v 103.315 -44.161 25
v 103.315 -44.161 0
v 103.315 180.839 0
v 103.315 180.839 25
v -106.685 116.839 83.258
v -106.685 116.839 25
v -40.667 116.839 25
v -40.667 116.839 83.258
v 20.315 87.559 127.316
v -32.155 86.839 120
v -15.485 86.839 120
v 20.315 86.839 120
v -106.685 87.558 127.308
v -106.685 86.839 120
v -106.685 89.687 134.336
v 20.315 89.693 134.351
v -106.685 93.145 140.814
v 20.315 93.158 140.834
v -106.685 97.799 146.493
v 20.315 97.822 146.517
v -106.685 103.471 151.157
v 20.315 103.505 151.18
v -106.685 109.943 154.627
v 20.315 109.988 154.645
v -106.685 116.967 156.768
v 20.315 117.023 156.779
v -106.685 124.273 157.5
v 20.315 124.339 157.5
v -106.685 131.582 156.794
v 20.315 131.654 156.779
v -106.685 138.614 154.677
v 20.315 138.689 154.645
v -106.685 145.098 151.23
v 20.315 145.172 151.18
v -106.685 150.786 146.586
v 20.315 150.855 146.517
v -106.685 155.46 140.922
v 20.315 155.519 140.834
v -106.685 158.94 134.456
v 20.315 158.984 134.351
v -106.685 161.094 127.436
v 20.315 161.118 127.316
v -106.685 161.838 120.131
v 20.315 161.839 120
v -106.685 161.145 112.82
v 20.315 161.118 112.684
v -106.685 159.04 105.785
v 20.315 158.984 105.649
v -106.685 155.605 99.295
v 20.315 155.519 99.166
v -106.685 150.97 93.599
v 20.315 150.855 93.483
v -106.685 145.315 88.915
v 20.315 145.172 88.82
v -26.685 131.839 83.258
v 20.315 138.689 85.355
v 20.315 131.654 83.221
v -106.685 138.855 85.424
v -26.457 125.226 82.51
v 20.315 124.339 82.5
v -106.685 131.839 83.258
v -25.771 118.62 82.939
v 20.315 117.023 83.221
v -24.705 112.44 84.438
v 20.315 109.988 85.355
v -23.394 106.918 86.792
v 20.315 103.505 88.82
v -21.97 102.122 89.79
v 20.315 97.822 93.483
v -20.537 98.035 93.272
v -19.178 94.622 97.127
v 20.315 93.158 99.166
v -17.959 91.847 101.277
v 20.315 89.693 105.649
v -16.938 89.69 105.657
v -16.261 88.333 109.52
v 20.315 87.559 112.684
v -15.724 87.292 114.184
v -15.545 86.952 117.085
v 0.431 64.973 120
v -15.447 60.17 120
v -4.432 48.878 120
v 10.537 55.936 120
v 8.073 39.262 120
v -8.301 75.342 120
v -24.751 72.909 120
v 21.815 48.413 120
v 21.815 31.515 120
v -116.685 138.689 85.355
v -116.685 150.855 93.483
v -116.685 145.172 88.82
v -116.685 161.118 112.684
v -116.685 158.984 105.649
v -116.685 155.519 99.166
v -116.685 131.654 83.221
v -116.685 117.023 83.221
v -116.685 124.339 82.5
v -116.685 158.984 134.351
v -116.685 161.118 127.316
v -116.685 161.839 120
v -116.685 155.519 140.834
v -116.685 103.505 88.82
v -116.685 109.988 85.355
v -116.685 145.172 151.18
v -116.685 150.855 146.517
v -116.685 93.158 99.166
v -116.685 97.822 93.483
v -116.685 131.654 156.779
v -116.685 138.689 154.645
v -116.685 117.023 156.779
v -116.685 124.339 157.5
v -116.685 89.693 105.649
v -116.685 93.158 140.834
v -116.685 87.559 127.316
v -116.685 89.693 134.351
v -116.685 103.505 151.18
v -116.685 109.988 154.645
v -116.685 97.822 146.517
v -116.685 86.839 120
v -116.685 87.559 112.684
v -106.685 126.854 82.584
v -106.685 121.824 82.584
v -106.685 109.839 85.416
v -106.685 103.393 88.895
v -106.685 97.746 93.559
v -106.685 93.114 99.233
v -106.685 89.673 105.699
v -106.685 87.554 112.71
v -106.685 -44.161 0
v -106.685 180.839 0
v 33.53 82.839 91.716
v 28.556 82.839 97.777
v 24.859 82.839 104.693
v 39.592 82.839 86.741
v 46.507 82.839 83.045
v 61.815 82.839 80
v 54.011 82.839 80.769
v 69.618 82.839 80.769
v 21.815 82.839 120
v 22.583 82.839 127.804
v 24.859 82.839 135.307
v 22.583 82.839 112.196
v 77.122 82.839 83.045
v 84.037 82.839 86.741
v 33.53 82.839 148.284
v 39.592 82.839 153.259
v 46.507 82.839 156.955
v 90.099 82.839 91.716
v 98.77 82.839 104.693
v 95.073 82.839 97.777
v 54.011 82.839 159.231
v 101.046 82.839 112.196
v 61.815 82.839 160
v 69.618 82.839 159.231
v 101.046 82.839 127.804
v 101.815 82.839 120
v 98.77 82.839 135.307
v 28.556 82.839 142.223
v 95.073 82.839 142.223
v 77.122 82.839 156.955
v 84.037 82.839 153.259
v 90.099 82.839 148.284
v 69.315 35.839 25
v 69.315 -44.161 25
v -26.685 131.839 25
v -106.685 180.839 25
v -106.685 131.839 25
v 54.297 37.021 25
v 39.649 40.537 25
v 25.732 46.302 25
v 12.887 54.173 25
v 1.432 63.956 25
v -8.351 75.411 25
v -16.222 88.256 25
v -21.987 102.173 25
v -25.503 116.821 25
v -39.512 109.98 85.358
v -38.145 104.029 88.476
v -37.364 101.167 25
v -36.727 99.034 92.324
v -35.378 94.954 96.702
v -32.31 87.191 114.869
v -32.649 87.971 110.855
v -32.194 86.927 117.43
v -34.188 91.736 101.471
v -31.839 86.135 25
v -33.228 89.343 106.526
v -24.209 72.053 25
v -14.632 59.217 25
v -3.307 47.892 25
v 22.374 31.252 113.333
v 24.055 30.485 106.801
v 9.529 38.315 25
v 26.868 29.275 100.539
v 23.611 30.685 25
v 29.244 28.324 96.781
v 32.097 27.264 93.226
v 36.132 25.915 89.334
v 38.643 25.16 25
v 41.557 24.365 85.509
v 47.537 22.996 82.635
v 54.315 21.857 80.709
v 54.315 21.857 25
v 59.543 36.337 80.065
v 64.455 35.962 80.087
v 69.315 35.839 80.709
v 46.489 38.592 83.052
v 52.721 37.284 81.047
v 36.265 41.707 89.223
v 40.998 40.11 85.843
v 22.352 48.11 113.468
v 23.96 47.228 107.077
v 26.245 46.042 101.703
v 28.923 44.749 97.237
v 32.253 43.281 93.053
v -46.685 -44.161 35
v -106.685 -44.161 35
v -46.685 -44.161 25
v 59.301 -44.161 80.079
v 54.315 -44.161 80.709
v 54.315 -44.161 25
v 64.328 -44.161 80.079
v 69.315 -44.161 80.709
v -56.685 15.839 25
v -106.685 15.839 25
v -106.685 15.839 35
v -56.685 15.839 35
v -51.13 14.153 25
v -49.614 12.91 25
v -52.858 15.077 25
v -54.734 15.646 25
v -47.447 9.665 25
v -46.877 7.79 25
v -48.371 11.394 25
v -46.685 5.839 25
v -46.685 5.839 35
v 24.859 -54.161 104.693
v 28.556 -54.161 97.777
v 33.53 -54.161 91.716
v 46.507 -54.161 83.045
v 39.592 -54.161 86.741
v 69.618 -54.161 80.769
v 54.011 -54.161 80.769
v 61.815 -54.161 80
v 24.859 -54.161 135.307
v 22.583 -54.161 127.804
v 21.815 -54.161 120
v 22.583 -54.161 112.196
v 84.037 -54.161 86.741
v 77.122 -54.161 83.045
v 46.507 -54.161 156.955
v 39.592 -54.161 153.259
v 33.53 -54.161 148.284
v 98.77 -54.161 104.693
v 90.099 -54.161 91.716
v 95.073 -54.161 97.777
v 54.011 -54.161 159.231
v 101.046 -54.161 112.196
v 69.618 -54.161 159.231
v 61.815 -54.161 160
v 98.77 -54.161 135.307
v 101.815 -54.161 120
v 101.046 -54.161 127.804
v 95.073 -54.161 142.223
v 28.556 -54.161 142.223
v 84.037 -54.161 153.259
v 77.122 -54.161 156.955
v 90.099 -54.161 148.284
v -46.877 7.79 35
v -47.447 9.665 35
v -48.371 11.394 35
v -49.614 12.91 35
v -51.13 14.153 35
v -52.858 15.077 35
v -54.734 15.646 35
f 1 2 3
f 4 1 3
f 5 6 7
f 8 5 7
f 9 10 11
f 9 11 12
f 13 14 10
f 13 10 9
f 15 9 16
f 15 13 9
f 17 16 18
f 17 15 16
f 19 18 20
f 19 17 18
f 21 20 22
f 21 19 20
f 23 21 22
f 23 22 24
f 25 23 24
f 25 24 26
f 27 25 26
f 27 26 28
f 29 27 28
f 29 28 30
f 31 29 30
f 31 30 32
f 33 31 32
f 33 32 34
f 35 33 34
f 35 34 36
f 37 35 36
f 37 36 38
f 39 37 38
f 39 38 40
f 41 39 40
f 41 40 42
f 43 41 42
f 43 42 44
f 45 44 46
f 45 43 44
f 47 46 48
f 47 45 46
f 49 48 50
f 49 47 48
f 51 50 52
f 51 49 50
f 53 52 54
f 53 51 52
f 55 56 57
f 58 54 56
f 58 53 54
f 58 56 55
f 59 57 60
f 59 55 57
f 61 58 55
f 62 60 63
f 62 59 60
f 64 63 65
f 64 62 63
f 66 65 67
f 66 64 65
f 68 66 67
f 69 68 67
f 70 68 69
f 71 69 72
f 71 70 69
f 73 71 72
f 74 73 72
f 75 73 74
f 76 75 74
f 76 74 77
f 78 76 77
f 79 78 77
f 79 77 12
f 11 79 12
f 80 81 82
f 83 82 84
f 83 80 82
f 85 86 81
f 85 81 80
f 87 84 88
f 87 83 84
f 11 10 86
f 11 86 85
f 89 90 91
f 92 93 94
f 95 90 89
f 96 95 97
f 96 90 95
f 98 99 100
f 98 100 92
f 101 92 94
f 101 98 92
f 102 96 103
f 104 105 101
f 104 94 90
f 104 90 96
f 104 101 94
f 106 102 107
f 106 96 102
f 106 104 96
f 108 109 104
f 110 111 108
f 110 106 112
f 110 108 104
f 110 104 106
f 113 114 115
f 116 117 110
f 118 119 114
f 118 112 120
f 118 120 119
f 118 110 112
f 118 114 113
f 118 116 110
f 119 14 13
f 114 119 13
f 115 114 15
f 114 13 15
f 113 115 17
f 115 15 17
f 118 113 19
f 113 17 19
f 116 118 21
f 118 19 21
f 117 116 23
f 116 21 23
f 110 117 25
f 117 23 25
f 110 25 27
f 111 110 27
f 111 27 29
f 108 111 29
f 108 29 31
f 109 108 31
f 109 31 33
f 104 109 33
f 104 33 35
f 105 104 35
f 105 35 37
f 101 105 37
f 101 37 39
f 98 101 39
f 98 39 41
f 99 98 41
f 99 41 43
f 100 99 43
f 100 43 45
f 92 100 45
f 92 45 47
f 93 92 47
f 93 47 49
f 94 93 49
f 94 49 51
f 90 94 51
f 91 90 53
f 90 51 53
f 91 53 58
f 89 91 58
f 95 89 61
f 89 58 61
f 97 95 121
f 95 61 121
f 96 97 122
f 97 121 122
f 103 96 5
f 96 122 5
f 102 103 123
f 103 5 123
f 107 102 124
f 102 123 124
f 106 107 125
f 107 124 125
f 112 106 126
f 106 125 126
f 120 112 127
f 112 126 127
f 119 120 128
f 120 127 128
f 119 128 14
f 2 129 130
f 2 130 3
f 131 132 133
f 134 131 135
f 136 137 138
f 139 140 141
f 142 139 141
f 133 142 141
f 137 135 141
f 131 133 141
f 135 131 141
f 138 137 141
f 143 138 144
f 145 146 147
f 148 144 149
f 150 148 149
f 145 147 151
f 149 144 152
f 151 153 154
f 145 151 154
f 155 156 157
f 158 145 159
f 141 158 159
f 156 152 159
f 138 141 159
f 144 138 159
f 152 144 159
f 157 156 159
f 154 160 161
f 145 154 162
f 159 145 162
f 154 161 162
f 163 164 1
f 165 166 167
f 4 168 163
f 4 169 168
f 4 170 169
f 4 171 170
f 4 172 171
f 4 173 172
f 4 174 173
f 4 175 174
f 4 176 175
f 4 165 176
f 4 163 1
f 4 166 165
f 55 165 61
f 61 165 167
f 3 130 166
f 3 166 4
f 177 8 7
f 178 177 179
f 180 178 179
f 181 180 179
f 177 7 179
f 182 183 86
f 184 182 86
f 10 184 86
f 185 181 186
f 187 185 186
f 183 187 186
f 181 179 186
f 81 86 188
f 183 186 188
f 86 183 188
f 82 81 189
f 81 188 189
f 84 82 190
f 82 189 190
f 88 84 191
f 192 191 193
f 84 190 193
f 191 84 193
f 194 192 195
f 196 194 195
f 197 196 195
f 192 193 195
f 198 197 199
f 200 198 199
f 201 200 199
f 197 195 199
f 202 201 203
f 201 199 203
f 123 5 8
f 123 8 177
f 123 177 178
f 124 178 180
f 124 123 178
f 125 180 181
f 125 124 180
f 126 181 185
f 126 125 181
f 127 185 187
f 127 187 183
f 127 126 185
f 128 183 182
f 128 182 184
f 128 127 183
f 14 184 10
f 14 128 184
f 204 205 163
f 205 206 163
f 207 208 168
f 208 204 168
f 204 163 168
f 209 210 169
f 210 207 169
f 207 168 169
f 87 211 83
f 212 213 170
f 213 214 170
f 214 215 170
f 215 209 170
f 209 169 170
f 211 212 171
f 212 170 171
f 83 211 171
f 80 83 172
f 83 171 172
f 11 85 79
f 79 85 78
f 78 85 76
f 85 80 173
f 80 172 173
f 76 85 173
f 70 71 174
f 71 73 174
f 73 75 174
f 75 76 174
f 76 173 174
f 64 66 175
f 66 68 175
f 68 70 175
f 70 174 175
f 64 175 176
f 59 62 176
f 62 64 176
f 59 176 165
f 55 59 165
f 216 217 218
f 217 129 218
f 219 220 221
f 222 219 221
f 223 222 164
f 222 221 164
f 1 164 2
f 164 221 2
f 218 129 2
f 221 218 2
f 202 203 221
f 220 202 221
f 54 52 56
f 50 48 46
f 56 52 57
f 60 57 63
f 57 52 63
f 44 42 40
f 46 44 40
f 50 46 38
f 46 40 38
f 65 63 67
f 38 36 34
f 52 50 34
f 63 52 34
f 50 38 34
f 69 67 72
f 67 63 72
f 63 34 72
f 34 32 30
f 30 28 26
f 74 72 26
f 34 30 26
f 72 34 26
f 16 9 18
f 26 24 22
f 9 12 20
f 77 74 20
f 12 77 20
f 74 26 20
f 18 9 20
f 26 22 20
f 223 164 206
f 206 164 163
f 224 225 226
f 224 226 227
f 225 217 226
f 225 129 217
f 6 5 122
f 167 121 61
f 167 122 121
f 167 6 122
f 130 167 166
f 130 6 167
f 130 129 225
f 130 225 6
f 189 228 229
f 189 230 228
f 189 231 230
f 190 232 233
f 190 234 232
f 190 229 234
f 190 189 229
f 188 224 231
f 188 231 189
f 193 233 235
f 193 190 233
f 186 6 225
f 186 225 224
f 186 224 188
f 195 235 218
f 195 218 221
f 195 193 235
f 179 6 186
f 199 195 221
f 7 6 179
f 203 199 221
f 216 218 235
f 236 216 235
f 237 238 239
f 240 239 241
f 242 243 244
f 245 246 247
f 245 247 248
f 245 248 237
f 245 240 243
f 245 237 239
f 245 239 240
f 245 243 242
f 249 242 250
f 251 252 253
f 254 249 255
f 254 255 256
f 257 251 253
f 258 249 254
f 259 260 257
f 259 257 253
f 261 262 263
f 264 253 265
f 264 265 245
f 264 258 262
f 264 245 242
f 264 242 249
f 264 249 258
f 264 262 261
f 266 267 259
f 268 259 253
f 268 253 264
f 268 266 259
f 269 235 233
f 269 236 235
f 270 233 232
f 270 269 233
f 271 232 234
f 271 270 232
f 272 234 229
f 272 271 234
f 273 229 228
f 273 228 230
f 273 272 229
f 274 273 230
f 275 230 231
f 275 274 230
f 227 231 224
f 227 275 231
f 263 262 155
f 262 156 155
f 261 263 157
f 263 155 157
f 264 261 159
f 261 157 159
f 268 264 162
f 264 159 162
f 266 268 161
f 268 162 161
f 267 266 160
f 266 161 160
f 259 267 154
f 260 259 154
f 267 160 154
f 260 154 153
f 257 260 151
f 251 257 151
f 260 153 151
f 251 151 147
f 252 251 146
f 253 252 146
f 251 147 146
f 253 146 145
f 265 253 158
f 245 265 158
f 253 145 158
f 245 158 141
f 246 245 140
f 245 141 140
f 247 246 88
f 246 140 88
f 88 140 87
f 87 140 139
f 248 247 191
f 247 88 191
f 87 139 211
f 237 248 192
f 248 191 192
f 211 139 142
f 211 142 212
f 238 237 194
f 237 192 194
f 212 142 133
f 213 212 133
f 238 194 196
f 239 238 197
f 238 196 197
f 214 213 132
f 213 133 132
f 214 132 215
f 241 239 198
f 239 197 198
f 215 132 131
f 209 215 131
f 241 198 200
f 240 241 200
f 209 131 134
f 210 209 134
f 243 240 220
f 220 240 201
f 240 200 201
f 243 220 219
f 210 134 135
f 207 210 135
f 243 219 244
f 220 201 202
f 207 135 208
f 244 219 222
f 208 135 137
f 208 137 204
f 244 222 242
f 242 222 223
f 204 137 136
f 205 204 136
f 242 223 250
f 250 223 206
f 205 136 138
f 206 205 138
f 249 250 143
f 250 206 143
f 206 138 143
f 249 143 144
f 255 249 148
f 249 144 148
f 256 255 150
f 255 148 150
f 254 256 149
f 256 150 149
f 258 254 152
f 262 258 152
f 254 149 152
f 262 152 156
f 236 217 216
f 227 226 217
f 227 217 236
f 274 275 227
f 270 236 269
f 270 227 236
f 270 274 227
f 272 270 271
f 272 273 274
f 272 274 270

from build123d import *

# Parameters (mm, degrees)
F0_W          = 210
F0_H          = 225
F1_DEPTH      = 25
F3_DEPTH      = 95
F4_R          = 37.5
F5_DEPTH      = 10
F5_DEPTH_BACK = 127
F6_R          = 40
F7_DEPTH      = 10
F7_DEPTH_BACK = 127
F8_W          = 60
F8_H          = 60
F9_DEPTH      = 10
F10_R         = 10


with BuildPart() as f1:
    # F0 (on Top) → F1 (new body)
    with BuildSketch(Plane.XY):
        with Locations((-1.685321, 68.338609)):
            Rectangle(F0_W, F0_H)
    extrude(amount=F1_DEPTH)

    # F2 (on face) → F3 (join)
    with BuildSketch(Plane.XY.offset(25)):
        with BuildLine():
            Line((-26.685321, 131.838609), (-106.685321, 131.838609))
            Line((-106.685321, 131.838609), (-106.685321, 116.838609))
            Line((-106.685321, 116.838609), (-40.667138, 116.838609))
            ThreePointArc((-40.667138, 116.838609), (-9.174174, 53.349757), (54.314679, 21.856793))
            Line((54.314679, 21.856793), (54.314679, -44.161391))
            Line((54.314679, -44.161391), (69.314679, -44.161391))
            Line((69.314679, -44.161391), (69.314679, 35.838609))
            ThreePointArc((69.314679, 35.838609), (1.432428, 63.956358), (-26.685321, 131.838609))
        make_face()
    extrude(amount=F3_DEPTH)

    # F4 (on face) → F5 (join, two sides)
    with BuildSketch(Plane(origin=(-106.685321, 0, 0), x_dir=(0, -1, 0), z_dir=(-1, 0, 0))) as f5_sk:
        with Locations((-124.338609, 120)):
            Circle(F4_R)
    extrude(amount=F5_DEPTH)
    extrude(f5_sk.sketch, amount=-F5_DEPTH_BACK)

    # F6 (on face) → F7 (join, two sides)
    with BuildSketch(Plane.XZ.offset(44.161391)) as f7_sk:
        with Locations((61.814679, 120)):
            Circle(F6_R)
    extrude(amount=F7_DEPTH)
    extrude(f7_sk.sketch, amount=-F7_DEPTH_BACK)

    # F8 (on face) → F9 (join)
    with BuildSketch(Plane.XY.offset(25)):
        with Locations((-76.685321, -14.161391)):
            Rectangle(F8_W, F8_H)
    extrude(amount=F9_DEPTH)

    # F10
    f10_edges = [f1.edges().sort_by_distance(p)[0] for p in [
        (-46.685321, 15.838609, 30),
    ]]
    fillet(f10_edges, radius=F10_R)


solid = f1.part
